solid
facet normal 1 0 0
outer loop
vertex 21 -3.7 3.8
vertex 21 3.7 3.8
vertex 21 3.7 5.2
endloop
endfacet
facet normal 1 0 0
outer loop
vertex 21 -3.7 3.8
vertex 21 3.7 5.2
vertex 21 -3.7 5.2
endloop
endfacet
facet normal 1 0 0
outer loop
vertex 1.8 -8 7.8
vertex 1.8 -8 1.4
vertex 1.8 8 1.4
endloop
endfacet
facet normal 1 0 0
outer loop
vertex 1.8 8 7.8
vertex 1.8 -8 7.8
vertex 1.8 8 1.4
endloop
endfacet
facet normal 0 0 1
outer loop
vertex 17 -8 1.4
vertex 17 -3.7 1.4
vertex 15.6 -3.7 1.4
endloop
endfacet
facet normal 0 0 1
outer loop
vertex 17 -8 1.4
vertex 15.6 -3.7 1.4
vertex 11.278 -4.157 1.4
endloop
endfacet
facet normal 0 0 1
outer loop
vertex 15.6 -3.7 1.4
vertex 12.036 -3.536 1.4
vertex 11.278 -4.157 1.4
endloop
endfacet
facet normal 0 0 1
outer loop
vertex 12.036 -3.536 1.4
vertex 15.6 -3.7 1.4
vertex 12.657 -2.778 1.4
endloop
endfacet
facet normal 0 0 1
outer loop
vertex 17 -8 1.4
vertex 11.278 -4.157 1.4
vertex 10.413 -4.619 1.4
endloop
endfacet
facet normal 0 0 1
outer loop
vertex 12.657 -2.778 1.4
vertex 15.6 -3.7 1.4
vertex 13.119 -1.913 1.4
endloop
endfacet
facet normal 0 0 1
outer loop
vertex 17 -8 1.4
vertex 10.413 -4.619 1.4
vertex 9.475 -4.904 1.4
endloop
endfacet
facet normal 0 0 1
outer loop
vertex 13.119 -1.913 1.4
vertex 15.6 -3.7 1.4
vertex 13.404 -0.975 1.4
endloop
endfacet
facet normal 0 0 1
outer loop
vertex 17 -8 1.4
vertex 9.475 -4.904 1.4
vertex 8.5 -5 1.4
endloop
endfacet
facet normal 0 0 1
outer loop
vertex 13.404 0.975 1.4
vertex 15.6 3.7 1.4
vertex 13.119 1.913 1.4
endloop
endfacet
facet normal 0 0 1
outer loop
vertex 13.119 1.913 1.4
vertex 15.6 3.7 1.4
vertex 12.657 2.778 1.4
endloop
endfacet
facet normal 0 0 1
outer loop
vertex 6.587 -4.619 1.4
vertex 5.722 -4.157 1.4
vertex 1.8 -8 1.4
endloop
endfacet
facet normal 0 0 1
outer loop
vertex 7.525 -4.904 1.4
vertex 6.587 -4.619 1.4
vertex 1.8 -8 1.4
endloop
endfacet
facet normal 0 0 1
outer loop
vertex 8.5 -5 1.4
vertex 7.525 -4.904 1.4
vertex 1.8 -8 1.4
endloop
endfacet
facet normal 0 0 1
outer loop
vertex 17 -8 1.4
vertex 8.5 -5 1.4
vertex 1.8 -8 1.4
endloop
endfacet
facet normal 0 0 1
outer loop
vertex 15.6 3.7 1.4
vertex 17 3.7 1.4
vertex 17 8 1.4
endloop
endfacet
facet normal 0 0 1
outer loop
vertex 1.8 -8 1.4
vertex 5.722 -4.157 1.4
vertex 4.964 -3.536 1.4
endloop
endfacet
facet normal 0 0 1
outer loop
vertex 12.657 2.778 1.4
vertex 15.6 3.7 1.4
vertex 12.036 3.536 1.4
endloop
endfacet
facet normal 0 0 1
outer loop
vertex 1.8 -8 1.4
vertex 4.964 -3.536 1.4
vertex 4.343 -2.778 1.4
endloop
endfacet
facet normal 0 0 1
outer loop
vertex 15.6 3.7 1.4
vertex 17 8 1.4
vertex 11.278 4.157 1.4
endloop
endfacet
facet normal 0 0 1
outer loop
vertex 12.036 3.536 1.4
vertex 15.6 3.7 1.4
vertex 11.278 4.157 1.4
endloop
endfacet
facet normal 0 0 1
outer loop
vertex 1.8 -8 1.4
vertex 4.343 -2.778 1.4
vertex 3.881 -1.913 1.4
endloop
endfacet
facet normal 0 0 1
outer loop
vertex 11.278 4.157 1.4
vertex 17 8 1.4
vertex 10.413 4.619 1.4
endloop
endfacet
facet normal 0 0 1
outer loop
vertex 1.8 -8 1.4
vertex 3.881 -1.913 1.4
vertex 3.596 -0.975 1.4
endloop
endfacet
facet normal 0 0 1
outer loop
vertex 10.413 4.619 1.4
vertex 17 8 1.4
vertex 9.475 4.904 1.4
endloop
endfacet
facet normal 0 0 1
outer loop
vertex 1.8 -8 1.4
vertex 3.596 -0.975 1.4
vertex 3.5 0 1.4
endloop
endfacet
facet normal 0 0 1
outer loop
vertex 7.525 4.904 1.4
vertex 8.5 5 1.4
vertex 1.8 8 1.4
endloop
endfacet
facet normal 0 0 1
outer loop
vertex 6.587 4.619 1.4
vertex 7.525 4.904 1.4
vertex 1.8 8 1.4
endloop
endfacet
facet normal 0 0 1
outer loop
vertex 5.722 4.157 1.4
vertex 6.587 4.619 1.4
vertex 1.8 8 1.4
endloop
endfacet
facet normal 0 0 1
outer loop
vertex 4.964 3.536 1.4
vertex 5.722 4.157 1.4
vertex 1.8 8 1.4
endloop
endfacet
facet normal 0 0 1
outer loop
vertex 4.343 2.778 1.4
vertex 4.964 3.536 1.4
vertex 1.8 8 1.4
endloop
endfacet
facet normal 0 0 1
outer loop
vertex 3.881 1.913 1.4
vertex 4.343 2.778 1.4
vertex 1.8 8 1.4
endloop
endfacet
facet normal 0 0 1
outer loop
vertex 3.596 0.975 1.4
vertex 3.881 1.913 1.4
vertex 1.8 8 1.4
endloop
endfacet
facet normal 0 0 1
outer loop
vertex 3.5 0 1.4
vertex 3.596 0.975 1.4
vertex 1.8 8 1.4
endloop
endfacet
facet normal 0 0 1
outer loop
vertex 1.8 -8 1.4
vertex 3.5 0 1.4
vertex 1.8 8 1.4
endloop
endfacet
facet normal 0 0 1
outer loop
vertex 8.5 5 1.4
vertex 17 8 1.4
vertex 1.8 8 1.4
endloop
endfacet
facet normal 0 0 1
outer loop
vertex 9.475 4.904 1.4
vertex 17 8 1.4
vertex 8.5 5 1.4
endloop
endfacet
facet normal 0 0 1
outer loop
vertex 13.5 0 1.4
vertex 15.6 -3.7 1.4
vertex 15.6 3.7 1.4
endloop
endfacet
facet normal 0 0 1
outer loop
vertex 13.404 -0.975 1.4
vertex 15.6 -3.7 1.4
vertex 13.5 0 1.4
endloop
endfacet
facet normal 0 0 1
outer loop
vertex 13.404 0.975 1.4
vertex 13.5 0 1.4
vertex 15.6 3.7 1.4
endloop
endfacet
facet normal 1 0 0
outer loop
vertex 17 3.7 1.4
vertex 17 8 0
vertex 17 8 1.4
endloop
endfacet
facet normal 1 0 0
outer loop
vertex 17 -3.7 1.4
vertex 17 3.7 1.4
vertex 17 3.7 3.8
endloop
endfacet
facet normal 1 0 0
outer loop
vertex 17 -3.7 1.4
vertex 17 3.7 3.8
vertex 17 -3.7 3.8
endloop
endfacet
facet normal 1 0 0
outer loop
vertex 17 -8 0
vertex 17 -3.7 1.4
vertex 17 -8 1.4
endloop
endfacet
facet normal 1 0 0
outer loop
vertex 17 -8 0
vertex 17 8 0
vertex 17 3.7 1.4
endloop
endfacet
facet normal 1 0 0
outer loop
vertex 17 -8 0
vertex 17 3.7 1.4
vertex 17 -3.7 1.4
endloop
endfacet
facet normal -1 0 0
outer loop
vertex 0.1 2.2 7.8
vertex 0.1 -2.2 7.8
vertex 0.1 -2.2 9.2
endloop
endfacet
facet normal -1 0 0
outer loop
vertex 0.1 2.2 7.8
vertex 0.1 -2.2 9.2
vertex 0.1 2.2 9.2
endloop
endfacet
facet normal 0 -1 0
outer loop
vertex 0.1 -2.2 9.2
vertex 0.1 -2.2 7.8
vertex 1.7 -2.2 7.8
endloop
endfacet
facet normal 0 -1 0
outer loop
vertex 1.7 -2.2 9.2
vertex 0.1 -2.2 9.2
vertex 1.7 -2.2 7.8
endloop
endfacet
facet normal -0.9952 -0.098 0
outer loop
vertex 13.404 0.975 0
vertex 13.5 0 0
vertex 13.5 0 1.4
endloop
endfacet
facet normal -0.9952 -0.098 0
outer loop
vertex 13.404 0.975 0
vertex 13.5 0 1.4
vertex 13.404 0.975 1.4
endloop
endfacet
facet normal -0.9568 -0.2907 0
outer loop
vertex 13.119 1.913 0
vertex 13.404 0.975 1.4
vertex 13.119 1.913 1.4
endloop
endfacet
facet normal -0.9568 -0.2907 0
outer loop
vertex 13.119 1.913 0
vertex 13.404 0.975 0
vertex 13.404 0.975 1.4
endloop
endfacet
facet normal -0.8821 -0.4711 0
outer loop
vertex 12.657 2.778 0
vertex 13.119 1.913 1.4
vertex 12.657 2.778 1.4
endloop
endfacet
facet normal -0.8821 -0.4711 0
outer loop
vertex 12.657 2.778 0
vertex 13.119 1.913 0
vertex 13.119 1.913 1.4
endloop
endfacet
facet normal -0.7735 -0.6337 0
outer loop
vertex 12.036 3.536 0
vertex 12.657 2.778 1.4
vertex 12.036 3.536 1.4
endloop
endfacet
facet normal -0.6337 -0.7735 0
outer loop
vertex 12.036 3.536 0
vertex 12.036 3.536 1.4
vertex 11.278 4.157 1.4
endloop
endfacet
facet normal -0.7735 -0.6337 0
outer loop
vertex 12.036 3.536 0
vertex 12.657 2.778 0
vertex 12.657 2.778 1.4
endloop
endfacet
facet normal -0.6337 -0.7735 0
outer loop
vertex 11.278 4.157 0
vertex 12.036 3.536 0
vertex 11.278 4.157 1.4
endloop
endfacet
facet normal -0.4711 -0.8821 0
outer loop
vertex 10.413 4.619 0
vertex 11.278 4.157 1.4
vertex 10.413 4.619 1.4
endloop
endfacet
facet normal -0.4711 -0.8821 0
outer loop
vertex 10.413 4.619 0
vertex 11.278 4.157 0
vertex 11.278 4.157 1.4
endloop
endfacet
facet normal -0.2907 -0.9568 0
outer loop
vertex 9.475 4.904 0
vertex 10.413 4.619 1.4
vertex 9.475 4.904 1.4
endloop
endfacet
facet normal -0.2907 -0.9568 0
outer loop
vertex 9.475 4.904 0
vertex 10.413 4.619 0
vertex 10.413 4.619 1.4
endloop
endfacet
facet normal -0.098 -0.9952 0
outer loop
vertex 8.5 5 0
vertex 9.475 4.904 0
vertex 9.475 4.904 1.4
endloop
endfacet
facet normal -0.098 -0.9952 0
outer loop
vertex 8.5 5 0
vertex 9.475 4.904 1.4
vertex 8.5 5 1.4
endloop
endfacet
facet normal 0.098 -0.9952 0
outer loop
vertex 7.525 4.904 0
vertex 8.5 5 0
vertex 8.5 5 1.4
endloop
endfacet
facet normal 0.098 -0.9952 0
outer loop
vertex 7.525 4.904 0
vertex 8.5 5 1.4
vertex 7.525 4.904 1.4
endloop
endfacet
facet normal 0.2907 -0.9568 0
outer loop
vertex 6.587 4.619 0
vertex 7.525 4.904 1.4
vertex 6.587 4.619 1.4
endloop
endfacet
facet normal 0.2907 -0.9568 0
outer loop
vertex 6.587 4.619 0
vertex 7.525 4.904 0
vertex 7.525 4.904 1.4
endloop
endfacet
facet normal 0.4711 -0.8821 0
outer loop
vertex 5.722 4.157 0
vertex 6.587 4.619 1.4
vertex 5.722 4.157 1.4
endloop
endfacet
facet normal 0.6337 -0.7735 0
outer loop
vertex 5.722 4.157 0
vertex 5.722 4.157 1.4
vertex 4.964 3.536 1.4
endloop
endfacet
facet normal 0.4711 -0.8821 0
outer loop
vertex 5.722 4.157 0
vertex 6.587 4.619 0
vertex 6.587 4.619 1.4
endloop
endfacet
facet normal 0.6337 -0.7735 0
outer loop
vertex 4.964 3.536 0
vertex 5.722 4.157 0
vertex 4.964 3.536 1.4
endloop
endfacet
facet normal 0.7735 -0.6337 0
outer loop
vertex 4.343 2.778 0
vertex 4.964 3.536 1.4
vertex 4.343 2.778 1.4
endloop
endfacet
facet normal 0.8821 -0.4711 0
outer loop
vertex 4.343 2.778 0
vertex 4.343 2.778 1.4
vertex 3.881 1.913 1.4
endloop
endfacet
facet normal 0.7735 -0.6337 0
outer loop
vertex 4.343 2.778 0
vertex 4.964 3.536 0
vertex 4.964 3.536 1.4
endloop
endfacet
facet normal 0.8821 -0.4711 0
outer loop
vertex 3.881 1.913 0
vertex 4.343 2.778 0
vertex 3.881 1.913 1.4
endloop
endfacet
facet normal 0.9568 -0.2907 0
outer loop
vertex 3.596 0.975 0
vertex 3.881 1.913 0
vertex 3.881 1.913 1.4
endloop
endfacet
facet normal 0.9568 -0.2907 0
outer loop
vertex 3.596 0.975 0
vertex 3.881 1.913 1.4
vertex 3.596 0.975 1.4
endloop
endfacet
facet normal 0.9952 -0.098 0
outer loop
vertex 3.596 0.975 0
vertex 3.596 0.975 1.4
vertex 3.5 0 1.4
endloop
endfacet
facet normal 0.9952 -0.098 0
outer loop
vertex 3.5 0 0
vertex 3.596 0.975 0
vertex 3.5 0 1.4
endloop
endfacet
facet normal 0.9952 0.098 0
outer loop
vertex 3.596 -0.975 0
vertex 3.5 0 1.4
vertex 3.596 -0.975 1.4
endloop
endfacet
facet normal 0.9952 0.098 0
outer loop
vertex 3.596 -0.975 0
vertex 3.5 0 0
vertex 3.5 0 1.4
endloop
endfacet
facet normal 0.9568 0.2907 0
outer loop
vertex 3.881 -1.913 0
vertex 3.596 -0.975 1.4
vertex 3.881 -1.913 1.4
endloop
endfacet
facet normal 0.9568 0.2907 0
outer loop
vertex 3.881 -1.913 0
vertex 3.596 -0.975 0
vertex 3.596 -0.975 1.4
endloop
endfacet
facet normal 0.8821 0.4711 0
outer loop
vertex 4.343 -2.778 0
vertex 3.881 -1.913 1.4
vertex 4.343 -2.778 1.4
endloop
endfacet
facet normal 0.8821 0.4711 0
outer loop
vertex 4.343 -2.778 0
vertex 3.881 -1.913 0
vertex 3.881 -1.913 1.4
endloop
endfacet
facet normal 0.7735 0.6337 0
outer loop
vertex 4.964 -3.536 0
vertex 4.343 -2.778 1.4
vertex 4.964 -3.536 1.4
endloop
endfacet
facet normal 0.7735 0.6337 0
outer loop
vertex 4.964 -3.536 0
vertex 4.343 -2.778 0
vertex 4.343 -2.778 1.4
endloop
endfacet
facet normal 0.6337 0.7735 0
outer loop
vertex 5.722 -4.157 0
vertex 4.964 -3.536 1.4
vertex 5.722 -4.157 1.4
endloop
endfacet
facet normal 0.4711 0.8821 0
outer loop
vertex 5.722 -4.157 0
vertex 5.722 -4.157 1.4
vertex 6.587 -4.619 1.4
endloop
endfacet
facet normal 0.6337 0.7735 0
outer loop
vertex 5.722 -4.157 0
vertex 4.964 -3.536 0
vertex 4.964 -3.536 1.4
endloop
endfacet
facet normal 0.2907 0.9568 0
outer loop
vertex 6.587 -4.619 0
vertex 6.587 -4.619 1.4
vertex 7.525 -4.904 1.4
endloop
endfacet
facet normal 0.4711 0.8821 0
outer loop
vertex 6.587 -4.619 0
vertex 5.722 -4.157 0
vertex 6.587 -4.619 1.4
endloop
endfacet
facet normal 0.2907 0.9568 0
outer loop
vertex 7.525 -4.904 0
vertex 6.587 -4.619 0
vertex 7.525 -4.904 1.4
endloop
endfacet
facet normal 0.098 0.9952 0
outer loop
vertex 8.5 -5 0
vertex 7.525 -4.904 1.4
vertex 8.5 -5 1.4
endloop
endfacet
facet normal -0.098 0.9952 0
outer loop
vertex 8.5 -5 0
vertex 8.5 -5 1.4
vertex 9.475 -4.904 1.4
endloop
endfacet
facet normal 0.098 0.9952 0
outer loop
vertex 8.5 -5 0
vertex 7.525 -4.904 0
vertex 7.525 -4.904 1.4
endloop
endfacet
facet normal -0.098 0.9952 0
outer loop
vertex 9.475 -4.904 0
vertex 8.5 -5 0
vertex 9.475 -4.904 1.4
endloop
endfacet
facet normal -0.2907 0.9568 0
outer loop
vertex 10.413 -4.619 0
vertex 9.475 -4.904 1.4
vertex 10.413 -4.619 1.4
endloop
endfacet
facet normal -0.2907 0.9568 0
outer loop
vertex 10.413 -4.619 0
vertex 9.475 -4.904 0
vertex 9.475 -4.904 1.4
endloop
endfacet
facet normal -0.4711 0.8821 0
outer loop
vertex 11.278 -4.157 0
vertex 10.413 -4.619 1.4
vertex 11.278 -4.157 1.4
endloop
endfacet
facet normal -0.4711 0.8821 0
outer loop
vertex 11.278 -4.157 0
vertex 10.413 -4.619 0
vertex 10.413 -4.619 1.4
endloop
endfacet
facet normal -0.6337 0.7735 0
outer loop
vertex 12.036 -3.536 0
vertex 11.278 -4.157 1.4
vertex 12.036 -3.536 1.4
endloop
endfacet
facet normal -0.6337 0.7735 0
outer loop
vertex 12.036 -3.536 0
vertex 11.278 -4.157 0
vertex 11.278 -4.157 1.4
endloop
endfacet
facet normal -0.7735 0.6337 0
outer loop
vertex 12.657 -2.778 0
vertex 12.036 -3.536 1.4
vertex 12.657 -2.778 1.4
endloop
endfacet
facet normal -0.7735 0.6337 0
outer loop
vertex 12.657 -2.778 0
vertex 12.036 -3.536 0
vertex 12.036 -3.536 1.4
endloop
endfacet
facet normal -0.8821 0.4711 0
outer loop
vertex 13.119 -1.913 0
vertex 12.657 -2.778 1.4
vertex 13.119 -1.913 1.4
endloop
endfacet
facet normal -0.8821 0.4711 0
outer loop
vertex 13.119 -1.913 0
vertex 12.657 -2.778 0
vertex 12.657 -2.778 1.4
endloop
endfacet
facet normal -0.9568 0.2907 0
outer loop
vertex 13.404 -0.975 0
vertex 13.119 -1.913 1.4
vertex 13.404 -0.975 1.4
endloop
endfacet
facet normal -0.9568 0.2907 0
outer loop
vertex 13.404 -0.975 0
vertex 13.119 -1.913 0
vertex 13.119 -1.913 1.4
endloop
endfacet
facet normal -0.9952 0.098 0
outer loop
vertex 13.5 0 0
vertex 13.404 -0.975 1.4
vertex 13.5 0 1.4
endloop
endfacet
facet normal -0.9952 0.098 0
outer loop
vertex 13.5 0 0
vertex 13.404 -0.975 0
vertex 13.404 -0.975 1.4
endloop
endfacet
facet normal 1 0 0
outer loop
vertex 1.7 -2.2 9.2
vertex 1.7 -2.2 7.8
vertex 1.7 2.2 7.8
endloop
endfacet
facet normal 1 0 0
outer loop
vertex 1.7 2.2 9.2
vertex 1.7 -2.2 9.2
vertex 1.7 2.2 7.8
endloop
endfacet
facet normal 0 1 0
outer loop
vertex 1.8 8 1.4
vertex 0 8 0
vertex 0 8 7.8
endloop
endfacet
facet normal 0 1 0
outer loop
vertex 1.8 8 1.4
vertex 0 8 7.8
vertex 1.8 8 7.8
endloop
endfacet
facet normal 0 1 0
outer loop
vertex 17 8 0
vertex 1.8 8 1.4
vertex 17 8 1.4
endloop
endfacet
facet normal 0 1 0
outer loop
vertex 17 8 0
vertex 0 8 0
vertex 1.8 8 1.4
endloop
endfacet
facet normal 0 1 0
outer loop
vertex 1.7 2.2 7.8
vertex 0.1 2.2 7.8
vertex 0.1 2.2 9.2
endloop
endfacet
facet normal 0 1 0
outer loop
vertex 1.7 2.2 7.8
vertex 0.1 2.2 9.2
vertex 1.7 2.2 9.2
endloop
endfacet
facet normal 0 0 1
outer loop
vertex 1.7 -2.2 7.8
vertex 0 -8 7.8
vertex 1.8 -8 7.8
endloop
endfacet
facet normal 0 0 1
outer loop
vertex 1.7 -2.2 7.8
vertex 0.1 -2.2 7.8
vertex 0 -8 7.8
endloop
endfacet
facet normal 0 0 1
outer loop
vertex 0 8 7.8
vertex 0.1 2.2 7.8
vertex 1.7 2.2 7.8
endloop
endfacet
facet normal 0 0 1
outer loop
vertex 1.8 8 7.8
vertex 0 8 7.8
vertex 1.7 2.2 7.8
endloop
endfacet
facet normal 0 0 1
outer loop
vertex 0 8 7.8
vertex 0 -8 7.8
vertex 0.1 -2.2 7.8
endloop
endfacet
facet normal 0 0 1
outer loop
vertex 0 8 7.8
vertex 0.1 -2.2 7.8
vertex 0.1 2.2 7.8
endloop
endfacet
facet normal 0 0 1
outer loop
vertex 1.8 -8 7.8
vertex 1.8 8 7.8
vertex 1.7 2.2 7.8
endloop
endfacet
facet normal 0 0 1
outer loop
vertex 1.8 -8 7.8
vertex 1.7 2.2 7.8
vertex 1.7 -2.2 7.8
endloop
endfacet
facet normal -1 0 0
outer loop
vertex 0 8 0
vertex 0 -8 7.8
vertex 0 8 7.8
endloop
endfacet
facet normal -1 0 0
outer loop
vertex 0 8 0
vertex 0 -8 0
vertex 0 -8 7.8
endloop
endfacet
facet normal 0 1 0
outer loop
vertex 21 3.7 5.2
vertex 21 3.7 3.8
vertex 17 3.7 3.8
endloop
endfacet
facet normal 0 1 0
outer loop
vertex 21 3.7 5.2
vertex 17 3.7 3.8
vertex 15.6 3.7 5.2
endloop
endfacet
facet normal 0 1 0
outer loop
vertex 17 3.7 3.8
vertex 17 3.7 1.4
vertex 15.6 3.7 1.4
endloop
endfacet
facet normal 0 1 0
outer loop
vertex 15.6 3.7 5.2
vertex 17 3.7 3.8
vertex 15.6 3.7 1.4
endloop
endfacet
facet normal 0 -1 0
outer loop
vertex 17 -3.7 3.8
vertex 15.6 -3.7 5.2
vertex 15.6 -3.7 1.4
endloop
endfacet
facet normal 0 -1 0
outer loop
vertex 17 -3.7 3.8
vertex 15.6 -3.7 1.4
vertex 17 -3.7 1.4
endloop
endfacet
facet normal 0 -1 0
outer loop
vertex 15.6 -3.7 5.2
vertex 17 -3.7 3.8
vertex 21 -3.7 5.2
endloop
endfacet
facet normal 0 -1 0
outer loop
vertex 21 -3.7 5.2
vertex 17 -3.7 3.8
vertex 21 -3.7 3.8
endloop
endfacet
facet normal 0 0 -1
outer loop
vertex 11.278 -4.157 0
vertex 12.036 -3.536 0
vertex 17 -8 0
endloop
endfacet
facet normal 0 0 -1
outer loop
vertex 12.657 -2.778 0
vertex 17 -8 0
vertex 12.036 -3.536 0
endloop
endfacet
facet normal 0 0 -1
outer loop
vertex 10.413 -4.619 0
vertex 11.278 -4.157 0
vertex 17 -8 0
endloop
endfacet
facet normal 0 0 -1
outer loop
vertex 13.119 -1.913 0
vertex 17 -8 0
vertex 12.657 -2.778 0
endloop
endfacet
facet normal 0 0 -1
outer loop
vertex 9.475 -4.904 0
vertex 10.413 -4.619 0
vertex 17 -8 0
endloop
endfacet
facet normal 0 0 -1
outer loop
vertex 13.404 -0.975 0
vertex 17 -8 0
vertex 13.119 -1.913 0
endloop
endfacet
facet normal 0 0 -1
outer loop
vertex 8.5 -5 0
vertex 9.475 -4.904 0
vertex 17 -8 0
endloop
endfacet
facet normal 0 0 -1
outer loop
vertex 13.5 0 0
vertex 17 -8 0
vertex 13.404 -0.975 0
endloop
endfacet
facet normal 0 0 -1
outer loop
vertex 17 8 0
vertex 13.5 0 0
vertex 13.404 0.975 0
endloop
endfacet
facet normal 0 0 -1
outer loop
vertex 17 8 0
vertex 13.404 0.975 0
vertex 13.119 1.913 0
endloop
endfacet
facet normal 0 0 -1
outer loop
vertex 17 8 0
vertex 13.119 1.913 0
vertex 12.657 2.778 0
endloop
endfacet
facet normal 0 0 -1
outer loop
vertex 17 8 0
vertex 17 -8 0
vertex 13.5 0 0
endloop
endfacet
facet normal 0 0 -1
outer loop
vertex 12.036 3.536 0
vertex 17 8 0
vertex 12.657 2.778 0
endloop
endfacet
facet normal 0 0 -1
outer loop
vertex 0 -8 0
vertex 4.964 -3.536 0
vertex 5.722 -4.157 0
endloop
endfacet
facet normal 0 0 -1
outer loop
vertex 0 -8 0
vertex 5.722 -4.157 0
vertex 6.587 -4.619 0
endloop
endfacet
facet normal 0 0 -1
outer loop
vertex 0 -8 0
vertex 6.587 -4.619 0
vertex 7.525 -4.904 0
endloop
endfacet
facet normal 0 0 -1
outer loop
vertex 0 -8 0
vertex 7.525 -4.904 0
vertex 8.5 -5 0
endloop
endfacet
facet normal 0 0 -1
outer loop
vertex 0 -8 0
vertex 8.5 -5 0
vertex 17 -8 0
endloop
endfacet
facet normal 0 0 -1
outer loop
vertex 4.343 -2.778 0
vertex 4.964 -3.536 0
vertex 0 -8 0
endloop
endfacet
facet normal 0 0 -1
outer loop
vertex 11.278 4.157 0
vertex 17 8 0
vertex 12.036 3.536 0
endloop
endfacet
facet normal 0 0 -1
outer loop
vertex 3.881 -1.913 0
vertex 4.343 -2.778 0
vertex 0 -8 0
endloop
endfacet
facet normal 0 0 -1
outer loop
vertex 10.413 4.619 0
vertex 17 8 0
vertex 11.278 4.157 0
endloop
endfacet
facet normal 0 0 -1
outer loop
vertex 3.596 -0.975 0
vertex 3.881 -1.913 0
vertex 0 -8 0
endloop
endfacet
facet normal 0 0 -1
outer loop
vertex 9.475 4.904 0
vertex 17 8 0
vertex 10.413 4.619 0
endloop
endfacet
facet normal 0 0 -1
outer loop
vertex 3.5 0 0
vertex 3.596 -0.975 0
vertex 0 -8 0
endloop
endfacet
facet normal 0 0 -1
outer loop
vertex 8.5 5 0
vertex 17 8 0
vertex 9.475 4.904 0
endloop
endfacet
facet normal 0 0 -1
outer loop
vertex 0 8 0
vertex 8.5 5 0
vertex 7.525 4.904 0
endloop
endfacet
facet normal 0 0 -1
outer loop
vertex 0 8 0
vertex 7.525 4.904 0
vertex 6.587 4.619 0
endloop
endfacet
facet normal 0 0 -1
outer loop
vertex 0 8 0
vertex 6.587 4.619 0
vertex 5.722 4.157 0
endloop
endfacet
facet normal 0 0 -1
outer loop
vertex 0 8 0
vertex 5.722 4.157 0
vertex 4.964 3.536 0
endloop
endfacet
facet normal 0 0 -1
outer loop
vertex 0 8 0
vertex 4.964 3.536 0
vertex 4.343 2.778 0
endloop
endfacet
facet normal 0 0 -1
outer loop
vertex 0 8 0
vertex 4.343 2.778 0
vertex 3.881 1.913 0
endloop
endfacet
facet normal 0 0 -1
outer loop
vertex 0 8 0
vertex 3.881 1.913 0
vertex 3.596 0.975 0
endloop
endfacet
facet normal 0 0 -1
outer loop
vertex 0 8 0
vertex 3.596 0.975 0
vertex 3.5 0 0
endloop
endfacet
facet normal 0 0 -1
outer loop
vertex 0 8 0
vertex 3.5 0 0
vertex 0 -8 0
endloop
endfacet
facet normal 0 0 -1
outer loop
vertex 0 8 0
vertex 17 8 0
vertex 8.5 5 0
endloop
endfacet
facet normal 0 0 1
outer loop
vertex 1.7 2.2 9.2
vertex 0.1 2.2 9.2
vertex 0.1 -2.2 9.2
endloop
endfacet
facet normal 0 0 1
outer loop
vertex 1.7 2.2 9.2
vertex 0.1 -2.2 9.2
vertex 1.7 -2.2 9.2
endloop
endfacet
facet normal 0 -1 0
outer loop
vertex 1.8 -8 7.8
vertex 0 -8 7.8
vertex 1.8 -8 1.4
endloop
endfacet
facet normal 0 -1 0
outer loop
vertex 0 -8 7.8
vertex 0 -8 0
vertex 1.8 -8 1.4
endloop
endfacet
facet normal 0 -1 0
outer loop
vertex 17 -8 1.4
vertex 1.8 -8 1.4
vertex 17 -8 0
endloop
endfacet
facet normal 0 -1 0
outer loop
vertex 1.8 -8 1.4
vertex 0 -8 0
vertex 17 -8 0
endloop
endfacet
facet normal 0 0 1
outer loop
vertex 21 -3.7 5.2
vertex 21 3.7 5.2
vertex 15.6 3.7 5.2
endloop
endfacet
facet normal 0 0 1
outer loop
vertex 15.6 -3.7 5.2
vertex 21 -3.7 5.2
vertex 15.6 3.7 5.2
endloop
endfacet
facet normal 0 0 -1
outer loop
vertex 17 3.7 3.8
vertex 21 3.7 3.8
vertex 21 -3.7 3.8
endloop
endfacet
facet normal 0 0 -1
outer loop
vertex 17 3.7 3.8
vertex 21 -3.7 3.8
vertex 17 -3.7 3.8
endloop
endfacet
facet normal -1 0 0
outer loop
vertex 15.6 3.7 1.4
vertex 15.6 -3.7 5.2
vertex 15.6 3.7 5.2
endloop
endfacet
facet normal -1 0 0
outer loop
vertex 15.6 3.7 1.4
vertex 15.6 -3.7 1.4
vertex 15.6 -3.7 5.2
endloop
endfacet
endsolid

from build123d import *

# Parameters (mm, degrees)
SKETCH157_R  = 5
PAD031_DEPTH = 1.4
SKETCH158_W  = 1.8
SKETCH158_H  = 16
PAD032_DEPTH = 6.4
SKETCH159_W  = 1.6
SKETCH159_H  = 4.4
PAD033_DEPTH = 1.4
SKETCH160_W  = 1.4
SKETCH160_H  = 7.4
PAD034_DEPTH = 2.4
PAD035_DEPTH = 1.4


with BuildPart() as part:
    # Sketch157 → Pad031 (new body)
    with BuildSketch(Plane.XY):
        Polygon((1.8, 8), (17, 8), (17, -8), (1.8, -8), (0, -8), (0, 8), align=None)
        with Locations((8.5, 0)):
            Circle(SKETCH157_R, mode=Mode.SUBTRACT)
    extrude(amount=PAD031_DEPTH)

    # Sketch158 (on Face5 of Pad031) → Pad032 (join)
    with BuildSketch(Plane.XY.offset(1.4)):
        with Locations((0.9, 0)):
            Rectangle(SKETCH158_W, SKETCH158_H)
    extrude(amount=PAD032_DEPTH)

    # Sketch159 (on Face6 of Pad032) → Pad033 (join)
    with BuildSketch(Plane.XY.offset(7.8)):
        with Locations((0.9, 0)):
            Rectangle(SKETCH159_W, SKETCH159_H)
    extrude(amount=PAD033_DEPTH)

    # Sketch160 (on Face5 of Pad033) → Pad034 (join)
    with BuildSketch(Plane.XY.offset(1.4)):
        with Locations((16.3, 0)):
            Rectangle(SKETCH160_W, SKETCH160_H)
    extrude(amount=PAD034_DEPTH)

    # Sketch161 (on Face12 of Pad034) → Pad035 (join)
    with BuildSketch(Plane.XY.offset(3.8)):
        Polygon((17, 3.7), (21, 3.7), (21, -3.7), (17, -3.7), (15.6, -3.7), (15.6, 3.7), align=None)
    extrude(amount=PAD035_DEPTH)


solid = part.part
